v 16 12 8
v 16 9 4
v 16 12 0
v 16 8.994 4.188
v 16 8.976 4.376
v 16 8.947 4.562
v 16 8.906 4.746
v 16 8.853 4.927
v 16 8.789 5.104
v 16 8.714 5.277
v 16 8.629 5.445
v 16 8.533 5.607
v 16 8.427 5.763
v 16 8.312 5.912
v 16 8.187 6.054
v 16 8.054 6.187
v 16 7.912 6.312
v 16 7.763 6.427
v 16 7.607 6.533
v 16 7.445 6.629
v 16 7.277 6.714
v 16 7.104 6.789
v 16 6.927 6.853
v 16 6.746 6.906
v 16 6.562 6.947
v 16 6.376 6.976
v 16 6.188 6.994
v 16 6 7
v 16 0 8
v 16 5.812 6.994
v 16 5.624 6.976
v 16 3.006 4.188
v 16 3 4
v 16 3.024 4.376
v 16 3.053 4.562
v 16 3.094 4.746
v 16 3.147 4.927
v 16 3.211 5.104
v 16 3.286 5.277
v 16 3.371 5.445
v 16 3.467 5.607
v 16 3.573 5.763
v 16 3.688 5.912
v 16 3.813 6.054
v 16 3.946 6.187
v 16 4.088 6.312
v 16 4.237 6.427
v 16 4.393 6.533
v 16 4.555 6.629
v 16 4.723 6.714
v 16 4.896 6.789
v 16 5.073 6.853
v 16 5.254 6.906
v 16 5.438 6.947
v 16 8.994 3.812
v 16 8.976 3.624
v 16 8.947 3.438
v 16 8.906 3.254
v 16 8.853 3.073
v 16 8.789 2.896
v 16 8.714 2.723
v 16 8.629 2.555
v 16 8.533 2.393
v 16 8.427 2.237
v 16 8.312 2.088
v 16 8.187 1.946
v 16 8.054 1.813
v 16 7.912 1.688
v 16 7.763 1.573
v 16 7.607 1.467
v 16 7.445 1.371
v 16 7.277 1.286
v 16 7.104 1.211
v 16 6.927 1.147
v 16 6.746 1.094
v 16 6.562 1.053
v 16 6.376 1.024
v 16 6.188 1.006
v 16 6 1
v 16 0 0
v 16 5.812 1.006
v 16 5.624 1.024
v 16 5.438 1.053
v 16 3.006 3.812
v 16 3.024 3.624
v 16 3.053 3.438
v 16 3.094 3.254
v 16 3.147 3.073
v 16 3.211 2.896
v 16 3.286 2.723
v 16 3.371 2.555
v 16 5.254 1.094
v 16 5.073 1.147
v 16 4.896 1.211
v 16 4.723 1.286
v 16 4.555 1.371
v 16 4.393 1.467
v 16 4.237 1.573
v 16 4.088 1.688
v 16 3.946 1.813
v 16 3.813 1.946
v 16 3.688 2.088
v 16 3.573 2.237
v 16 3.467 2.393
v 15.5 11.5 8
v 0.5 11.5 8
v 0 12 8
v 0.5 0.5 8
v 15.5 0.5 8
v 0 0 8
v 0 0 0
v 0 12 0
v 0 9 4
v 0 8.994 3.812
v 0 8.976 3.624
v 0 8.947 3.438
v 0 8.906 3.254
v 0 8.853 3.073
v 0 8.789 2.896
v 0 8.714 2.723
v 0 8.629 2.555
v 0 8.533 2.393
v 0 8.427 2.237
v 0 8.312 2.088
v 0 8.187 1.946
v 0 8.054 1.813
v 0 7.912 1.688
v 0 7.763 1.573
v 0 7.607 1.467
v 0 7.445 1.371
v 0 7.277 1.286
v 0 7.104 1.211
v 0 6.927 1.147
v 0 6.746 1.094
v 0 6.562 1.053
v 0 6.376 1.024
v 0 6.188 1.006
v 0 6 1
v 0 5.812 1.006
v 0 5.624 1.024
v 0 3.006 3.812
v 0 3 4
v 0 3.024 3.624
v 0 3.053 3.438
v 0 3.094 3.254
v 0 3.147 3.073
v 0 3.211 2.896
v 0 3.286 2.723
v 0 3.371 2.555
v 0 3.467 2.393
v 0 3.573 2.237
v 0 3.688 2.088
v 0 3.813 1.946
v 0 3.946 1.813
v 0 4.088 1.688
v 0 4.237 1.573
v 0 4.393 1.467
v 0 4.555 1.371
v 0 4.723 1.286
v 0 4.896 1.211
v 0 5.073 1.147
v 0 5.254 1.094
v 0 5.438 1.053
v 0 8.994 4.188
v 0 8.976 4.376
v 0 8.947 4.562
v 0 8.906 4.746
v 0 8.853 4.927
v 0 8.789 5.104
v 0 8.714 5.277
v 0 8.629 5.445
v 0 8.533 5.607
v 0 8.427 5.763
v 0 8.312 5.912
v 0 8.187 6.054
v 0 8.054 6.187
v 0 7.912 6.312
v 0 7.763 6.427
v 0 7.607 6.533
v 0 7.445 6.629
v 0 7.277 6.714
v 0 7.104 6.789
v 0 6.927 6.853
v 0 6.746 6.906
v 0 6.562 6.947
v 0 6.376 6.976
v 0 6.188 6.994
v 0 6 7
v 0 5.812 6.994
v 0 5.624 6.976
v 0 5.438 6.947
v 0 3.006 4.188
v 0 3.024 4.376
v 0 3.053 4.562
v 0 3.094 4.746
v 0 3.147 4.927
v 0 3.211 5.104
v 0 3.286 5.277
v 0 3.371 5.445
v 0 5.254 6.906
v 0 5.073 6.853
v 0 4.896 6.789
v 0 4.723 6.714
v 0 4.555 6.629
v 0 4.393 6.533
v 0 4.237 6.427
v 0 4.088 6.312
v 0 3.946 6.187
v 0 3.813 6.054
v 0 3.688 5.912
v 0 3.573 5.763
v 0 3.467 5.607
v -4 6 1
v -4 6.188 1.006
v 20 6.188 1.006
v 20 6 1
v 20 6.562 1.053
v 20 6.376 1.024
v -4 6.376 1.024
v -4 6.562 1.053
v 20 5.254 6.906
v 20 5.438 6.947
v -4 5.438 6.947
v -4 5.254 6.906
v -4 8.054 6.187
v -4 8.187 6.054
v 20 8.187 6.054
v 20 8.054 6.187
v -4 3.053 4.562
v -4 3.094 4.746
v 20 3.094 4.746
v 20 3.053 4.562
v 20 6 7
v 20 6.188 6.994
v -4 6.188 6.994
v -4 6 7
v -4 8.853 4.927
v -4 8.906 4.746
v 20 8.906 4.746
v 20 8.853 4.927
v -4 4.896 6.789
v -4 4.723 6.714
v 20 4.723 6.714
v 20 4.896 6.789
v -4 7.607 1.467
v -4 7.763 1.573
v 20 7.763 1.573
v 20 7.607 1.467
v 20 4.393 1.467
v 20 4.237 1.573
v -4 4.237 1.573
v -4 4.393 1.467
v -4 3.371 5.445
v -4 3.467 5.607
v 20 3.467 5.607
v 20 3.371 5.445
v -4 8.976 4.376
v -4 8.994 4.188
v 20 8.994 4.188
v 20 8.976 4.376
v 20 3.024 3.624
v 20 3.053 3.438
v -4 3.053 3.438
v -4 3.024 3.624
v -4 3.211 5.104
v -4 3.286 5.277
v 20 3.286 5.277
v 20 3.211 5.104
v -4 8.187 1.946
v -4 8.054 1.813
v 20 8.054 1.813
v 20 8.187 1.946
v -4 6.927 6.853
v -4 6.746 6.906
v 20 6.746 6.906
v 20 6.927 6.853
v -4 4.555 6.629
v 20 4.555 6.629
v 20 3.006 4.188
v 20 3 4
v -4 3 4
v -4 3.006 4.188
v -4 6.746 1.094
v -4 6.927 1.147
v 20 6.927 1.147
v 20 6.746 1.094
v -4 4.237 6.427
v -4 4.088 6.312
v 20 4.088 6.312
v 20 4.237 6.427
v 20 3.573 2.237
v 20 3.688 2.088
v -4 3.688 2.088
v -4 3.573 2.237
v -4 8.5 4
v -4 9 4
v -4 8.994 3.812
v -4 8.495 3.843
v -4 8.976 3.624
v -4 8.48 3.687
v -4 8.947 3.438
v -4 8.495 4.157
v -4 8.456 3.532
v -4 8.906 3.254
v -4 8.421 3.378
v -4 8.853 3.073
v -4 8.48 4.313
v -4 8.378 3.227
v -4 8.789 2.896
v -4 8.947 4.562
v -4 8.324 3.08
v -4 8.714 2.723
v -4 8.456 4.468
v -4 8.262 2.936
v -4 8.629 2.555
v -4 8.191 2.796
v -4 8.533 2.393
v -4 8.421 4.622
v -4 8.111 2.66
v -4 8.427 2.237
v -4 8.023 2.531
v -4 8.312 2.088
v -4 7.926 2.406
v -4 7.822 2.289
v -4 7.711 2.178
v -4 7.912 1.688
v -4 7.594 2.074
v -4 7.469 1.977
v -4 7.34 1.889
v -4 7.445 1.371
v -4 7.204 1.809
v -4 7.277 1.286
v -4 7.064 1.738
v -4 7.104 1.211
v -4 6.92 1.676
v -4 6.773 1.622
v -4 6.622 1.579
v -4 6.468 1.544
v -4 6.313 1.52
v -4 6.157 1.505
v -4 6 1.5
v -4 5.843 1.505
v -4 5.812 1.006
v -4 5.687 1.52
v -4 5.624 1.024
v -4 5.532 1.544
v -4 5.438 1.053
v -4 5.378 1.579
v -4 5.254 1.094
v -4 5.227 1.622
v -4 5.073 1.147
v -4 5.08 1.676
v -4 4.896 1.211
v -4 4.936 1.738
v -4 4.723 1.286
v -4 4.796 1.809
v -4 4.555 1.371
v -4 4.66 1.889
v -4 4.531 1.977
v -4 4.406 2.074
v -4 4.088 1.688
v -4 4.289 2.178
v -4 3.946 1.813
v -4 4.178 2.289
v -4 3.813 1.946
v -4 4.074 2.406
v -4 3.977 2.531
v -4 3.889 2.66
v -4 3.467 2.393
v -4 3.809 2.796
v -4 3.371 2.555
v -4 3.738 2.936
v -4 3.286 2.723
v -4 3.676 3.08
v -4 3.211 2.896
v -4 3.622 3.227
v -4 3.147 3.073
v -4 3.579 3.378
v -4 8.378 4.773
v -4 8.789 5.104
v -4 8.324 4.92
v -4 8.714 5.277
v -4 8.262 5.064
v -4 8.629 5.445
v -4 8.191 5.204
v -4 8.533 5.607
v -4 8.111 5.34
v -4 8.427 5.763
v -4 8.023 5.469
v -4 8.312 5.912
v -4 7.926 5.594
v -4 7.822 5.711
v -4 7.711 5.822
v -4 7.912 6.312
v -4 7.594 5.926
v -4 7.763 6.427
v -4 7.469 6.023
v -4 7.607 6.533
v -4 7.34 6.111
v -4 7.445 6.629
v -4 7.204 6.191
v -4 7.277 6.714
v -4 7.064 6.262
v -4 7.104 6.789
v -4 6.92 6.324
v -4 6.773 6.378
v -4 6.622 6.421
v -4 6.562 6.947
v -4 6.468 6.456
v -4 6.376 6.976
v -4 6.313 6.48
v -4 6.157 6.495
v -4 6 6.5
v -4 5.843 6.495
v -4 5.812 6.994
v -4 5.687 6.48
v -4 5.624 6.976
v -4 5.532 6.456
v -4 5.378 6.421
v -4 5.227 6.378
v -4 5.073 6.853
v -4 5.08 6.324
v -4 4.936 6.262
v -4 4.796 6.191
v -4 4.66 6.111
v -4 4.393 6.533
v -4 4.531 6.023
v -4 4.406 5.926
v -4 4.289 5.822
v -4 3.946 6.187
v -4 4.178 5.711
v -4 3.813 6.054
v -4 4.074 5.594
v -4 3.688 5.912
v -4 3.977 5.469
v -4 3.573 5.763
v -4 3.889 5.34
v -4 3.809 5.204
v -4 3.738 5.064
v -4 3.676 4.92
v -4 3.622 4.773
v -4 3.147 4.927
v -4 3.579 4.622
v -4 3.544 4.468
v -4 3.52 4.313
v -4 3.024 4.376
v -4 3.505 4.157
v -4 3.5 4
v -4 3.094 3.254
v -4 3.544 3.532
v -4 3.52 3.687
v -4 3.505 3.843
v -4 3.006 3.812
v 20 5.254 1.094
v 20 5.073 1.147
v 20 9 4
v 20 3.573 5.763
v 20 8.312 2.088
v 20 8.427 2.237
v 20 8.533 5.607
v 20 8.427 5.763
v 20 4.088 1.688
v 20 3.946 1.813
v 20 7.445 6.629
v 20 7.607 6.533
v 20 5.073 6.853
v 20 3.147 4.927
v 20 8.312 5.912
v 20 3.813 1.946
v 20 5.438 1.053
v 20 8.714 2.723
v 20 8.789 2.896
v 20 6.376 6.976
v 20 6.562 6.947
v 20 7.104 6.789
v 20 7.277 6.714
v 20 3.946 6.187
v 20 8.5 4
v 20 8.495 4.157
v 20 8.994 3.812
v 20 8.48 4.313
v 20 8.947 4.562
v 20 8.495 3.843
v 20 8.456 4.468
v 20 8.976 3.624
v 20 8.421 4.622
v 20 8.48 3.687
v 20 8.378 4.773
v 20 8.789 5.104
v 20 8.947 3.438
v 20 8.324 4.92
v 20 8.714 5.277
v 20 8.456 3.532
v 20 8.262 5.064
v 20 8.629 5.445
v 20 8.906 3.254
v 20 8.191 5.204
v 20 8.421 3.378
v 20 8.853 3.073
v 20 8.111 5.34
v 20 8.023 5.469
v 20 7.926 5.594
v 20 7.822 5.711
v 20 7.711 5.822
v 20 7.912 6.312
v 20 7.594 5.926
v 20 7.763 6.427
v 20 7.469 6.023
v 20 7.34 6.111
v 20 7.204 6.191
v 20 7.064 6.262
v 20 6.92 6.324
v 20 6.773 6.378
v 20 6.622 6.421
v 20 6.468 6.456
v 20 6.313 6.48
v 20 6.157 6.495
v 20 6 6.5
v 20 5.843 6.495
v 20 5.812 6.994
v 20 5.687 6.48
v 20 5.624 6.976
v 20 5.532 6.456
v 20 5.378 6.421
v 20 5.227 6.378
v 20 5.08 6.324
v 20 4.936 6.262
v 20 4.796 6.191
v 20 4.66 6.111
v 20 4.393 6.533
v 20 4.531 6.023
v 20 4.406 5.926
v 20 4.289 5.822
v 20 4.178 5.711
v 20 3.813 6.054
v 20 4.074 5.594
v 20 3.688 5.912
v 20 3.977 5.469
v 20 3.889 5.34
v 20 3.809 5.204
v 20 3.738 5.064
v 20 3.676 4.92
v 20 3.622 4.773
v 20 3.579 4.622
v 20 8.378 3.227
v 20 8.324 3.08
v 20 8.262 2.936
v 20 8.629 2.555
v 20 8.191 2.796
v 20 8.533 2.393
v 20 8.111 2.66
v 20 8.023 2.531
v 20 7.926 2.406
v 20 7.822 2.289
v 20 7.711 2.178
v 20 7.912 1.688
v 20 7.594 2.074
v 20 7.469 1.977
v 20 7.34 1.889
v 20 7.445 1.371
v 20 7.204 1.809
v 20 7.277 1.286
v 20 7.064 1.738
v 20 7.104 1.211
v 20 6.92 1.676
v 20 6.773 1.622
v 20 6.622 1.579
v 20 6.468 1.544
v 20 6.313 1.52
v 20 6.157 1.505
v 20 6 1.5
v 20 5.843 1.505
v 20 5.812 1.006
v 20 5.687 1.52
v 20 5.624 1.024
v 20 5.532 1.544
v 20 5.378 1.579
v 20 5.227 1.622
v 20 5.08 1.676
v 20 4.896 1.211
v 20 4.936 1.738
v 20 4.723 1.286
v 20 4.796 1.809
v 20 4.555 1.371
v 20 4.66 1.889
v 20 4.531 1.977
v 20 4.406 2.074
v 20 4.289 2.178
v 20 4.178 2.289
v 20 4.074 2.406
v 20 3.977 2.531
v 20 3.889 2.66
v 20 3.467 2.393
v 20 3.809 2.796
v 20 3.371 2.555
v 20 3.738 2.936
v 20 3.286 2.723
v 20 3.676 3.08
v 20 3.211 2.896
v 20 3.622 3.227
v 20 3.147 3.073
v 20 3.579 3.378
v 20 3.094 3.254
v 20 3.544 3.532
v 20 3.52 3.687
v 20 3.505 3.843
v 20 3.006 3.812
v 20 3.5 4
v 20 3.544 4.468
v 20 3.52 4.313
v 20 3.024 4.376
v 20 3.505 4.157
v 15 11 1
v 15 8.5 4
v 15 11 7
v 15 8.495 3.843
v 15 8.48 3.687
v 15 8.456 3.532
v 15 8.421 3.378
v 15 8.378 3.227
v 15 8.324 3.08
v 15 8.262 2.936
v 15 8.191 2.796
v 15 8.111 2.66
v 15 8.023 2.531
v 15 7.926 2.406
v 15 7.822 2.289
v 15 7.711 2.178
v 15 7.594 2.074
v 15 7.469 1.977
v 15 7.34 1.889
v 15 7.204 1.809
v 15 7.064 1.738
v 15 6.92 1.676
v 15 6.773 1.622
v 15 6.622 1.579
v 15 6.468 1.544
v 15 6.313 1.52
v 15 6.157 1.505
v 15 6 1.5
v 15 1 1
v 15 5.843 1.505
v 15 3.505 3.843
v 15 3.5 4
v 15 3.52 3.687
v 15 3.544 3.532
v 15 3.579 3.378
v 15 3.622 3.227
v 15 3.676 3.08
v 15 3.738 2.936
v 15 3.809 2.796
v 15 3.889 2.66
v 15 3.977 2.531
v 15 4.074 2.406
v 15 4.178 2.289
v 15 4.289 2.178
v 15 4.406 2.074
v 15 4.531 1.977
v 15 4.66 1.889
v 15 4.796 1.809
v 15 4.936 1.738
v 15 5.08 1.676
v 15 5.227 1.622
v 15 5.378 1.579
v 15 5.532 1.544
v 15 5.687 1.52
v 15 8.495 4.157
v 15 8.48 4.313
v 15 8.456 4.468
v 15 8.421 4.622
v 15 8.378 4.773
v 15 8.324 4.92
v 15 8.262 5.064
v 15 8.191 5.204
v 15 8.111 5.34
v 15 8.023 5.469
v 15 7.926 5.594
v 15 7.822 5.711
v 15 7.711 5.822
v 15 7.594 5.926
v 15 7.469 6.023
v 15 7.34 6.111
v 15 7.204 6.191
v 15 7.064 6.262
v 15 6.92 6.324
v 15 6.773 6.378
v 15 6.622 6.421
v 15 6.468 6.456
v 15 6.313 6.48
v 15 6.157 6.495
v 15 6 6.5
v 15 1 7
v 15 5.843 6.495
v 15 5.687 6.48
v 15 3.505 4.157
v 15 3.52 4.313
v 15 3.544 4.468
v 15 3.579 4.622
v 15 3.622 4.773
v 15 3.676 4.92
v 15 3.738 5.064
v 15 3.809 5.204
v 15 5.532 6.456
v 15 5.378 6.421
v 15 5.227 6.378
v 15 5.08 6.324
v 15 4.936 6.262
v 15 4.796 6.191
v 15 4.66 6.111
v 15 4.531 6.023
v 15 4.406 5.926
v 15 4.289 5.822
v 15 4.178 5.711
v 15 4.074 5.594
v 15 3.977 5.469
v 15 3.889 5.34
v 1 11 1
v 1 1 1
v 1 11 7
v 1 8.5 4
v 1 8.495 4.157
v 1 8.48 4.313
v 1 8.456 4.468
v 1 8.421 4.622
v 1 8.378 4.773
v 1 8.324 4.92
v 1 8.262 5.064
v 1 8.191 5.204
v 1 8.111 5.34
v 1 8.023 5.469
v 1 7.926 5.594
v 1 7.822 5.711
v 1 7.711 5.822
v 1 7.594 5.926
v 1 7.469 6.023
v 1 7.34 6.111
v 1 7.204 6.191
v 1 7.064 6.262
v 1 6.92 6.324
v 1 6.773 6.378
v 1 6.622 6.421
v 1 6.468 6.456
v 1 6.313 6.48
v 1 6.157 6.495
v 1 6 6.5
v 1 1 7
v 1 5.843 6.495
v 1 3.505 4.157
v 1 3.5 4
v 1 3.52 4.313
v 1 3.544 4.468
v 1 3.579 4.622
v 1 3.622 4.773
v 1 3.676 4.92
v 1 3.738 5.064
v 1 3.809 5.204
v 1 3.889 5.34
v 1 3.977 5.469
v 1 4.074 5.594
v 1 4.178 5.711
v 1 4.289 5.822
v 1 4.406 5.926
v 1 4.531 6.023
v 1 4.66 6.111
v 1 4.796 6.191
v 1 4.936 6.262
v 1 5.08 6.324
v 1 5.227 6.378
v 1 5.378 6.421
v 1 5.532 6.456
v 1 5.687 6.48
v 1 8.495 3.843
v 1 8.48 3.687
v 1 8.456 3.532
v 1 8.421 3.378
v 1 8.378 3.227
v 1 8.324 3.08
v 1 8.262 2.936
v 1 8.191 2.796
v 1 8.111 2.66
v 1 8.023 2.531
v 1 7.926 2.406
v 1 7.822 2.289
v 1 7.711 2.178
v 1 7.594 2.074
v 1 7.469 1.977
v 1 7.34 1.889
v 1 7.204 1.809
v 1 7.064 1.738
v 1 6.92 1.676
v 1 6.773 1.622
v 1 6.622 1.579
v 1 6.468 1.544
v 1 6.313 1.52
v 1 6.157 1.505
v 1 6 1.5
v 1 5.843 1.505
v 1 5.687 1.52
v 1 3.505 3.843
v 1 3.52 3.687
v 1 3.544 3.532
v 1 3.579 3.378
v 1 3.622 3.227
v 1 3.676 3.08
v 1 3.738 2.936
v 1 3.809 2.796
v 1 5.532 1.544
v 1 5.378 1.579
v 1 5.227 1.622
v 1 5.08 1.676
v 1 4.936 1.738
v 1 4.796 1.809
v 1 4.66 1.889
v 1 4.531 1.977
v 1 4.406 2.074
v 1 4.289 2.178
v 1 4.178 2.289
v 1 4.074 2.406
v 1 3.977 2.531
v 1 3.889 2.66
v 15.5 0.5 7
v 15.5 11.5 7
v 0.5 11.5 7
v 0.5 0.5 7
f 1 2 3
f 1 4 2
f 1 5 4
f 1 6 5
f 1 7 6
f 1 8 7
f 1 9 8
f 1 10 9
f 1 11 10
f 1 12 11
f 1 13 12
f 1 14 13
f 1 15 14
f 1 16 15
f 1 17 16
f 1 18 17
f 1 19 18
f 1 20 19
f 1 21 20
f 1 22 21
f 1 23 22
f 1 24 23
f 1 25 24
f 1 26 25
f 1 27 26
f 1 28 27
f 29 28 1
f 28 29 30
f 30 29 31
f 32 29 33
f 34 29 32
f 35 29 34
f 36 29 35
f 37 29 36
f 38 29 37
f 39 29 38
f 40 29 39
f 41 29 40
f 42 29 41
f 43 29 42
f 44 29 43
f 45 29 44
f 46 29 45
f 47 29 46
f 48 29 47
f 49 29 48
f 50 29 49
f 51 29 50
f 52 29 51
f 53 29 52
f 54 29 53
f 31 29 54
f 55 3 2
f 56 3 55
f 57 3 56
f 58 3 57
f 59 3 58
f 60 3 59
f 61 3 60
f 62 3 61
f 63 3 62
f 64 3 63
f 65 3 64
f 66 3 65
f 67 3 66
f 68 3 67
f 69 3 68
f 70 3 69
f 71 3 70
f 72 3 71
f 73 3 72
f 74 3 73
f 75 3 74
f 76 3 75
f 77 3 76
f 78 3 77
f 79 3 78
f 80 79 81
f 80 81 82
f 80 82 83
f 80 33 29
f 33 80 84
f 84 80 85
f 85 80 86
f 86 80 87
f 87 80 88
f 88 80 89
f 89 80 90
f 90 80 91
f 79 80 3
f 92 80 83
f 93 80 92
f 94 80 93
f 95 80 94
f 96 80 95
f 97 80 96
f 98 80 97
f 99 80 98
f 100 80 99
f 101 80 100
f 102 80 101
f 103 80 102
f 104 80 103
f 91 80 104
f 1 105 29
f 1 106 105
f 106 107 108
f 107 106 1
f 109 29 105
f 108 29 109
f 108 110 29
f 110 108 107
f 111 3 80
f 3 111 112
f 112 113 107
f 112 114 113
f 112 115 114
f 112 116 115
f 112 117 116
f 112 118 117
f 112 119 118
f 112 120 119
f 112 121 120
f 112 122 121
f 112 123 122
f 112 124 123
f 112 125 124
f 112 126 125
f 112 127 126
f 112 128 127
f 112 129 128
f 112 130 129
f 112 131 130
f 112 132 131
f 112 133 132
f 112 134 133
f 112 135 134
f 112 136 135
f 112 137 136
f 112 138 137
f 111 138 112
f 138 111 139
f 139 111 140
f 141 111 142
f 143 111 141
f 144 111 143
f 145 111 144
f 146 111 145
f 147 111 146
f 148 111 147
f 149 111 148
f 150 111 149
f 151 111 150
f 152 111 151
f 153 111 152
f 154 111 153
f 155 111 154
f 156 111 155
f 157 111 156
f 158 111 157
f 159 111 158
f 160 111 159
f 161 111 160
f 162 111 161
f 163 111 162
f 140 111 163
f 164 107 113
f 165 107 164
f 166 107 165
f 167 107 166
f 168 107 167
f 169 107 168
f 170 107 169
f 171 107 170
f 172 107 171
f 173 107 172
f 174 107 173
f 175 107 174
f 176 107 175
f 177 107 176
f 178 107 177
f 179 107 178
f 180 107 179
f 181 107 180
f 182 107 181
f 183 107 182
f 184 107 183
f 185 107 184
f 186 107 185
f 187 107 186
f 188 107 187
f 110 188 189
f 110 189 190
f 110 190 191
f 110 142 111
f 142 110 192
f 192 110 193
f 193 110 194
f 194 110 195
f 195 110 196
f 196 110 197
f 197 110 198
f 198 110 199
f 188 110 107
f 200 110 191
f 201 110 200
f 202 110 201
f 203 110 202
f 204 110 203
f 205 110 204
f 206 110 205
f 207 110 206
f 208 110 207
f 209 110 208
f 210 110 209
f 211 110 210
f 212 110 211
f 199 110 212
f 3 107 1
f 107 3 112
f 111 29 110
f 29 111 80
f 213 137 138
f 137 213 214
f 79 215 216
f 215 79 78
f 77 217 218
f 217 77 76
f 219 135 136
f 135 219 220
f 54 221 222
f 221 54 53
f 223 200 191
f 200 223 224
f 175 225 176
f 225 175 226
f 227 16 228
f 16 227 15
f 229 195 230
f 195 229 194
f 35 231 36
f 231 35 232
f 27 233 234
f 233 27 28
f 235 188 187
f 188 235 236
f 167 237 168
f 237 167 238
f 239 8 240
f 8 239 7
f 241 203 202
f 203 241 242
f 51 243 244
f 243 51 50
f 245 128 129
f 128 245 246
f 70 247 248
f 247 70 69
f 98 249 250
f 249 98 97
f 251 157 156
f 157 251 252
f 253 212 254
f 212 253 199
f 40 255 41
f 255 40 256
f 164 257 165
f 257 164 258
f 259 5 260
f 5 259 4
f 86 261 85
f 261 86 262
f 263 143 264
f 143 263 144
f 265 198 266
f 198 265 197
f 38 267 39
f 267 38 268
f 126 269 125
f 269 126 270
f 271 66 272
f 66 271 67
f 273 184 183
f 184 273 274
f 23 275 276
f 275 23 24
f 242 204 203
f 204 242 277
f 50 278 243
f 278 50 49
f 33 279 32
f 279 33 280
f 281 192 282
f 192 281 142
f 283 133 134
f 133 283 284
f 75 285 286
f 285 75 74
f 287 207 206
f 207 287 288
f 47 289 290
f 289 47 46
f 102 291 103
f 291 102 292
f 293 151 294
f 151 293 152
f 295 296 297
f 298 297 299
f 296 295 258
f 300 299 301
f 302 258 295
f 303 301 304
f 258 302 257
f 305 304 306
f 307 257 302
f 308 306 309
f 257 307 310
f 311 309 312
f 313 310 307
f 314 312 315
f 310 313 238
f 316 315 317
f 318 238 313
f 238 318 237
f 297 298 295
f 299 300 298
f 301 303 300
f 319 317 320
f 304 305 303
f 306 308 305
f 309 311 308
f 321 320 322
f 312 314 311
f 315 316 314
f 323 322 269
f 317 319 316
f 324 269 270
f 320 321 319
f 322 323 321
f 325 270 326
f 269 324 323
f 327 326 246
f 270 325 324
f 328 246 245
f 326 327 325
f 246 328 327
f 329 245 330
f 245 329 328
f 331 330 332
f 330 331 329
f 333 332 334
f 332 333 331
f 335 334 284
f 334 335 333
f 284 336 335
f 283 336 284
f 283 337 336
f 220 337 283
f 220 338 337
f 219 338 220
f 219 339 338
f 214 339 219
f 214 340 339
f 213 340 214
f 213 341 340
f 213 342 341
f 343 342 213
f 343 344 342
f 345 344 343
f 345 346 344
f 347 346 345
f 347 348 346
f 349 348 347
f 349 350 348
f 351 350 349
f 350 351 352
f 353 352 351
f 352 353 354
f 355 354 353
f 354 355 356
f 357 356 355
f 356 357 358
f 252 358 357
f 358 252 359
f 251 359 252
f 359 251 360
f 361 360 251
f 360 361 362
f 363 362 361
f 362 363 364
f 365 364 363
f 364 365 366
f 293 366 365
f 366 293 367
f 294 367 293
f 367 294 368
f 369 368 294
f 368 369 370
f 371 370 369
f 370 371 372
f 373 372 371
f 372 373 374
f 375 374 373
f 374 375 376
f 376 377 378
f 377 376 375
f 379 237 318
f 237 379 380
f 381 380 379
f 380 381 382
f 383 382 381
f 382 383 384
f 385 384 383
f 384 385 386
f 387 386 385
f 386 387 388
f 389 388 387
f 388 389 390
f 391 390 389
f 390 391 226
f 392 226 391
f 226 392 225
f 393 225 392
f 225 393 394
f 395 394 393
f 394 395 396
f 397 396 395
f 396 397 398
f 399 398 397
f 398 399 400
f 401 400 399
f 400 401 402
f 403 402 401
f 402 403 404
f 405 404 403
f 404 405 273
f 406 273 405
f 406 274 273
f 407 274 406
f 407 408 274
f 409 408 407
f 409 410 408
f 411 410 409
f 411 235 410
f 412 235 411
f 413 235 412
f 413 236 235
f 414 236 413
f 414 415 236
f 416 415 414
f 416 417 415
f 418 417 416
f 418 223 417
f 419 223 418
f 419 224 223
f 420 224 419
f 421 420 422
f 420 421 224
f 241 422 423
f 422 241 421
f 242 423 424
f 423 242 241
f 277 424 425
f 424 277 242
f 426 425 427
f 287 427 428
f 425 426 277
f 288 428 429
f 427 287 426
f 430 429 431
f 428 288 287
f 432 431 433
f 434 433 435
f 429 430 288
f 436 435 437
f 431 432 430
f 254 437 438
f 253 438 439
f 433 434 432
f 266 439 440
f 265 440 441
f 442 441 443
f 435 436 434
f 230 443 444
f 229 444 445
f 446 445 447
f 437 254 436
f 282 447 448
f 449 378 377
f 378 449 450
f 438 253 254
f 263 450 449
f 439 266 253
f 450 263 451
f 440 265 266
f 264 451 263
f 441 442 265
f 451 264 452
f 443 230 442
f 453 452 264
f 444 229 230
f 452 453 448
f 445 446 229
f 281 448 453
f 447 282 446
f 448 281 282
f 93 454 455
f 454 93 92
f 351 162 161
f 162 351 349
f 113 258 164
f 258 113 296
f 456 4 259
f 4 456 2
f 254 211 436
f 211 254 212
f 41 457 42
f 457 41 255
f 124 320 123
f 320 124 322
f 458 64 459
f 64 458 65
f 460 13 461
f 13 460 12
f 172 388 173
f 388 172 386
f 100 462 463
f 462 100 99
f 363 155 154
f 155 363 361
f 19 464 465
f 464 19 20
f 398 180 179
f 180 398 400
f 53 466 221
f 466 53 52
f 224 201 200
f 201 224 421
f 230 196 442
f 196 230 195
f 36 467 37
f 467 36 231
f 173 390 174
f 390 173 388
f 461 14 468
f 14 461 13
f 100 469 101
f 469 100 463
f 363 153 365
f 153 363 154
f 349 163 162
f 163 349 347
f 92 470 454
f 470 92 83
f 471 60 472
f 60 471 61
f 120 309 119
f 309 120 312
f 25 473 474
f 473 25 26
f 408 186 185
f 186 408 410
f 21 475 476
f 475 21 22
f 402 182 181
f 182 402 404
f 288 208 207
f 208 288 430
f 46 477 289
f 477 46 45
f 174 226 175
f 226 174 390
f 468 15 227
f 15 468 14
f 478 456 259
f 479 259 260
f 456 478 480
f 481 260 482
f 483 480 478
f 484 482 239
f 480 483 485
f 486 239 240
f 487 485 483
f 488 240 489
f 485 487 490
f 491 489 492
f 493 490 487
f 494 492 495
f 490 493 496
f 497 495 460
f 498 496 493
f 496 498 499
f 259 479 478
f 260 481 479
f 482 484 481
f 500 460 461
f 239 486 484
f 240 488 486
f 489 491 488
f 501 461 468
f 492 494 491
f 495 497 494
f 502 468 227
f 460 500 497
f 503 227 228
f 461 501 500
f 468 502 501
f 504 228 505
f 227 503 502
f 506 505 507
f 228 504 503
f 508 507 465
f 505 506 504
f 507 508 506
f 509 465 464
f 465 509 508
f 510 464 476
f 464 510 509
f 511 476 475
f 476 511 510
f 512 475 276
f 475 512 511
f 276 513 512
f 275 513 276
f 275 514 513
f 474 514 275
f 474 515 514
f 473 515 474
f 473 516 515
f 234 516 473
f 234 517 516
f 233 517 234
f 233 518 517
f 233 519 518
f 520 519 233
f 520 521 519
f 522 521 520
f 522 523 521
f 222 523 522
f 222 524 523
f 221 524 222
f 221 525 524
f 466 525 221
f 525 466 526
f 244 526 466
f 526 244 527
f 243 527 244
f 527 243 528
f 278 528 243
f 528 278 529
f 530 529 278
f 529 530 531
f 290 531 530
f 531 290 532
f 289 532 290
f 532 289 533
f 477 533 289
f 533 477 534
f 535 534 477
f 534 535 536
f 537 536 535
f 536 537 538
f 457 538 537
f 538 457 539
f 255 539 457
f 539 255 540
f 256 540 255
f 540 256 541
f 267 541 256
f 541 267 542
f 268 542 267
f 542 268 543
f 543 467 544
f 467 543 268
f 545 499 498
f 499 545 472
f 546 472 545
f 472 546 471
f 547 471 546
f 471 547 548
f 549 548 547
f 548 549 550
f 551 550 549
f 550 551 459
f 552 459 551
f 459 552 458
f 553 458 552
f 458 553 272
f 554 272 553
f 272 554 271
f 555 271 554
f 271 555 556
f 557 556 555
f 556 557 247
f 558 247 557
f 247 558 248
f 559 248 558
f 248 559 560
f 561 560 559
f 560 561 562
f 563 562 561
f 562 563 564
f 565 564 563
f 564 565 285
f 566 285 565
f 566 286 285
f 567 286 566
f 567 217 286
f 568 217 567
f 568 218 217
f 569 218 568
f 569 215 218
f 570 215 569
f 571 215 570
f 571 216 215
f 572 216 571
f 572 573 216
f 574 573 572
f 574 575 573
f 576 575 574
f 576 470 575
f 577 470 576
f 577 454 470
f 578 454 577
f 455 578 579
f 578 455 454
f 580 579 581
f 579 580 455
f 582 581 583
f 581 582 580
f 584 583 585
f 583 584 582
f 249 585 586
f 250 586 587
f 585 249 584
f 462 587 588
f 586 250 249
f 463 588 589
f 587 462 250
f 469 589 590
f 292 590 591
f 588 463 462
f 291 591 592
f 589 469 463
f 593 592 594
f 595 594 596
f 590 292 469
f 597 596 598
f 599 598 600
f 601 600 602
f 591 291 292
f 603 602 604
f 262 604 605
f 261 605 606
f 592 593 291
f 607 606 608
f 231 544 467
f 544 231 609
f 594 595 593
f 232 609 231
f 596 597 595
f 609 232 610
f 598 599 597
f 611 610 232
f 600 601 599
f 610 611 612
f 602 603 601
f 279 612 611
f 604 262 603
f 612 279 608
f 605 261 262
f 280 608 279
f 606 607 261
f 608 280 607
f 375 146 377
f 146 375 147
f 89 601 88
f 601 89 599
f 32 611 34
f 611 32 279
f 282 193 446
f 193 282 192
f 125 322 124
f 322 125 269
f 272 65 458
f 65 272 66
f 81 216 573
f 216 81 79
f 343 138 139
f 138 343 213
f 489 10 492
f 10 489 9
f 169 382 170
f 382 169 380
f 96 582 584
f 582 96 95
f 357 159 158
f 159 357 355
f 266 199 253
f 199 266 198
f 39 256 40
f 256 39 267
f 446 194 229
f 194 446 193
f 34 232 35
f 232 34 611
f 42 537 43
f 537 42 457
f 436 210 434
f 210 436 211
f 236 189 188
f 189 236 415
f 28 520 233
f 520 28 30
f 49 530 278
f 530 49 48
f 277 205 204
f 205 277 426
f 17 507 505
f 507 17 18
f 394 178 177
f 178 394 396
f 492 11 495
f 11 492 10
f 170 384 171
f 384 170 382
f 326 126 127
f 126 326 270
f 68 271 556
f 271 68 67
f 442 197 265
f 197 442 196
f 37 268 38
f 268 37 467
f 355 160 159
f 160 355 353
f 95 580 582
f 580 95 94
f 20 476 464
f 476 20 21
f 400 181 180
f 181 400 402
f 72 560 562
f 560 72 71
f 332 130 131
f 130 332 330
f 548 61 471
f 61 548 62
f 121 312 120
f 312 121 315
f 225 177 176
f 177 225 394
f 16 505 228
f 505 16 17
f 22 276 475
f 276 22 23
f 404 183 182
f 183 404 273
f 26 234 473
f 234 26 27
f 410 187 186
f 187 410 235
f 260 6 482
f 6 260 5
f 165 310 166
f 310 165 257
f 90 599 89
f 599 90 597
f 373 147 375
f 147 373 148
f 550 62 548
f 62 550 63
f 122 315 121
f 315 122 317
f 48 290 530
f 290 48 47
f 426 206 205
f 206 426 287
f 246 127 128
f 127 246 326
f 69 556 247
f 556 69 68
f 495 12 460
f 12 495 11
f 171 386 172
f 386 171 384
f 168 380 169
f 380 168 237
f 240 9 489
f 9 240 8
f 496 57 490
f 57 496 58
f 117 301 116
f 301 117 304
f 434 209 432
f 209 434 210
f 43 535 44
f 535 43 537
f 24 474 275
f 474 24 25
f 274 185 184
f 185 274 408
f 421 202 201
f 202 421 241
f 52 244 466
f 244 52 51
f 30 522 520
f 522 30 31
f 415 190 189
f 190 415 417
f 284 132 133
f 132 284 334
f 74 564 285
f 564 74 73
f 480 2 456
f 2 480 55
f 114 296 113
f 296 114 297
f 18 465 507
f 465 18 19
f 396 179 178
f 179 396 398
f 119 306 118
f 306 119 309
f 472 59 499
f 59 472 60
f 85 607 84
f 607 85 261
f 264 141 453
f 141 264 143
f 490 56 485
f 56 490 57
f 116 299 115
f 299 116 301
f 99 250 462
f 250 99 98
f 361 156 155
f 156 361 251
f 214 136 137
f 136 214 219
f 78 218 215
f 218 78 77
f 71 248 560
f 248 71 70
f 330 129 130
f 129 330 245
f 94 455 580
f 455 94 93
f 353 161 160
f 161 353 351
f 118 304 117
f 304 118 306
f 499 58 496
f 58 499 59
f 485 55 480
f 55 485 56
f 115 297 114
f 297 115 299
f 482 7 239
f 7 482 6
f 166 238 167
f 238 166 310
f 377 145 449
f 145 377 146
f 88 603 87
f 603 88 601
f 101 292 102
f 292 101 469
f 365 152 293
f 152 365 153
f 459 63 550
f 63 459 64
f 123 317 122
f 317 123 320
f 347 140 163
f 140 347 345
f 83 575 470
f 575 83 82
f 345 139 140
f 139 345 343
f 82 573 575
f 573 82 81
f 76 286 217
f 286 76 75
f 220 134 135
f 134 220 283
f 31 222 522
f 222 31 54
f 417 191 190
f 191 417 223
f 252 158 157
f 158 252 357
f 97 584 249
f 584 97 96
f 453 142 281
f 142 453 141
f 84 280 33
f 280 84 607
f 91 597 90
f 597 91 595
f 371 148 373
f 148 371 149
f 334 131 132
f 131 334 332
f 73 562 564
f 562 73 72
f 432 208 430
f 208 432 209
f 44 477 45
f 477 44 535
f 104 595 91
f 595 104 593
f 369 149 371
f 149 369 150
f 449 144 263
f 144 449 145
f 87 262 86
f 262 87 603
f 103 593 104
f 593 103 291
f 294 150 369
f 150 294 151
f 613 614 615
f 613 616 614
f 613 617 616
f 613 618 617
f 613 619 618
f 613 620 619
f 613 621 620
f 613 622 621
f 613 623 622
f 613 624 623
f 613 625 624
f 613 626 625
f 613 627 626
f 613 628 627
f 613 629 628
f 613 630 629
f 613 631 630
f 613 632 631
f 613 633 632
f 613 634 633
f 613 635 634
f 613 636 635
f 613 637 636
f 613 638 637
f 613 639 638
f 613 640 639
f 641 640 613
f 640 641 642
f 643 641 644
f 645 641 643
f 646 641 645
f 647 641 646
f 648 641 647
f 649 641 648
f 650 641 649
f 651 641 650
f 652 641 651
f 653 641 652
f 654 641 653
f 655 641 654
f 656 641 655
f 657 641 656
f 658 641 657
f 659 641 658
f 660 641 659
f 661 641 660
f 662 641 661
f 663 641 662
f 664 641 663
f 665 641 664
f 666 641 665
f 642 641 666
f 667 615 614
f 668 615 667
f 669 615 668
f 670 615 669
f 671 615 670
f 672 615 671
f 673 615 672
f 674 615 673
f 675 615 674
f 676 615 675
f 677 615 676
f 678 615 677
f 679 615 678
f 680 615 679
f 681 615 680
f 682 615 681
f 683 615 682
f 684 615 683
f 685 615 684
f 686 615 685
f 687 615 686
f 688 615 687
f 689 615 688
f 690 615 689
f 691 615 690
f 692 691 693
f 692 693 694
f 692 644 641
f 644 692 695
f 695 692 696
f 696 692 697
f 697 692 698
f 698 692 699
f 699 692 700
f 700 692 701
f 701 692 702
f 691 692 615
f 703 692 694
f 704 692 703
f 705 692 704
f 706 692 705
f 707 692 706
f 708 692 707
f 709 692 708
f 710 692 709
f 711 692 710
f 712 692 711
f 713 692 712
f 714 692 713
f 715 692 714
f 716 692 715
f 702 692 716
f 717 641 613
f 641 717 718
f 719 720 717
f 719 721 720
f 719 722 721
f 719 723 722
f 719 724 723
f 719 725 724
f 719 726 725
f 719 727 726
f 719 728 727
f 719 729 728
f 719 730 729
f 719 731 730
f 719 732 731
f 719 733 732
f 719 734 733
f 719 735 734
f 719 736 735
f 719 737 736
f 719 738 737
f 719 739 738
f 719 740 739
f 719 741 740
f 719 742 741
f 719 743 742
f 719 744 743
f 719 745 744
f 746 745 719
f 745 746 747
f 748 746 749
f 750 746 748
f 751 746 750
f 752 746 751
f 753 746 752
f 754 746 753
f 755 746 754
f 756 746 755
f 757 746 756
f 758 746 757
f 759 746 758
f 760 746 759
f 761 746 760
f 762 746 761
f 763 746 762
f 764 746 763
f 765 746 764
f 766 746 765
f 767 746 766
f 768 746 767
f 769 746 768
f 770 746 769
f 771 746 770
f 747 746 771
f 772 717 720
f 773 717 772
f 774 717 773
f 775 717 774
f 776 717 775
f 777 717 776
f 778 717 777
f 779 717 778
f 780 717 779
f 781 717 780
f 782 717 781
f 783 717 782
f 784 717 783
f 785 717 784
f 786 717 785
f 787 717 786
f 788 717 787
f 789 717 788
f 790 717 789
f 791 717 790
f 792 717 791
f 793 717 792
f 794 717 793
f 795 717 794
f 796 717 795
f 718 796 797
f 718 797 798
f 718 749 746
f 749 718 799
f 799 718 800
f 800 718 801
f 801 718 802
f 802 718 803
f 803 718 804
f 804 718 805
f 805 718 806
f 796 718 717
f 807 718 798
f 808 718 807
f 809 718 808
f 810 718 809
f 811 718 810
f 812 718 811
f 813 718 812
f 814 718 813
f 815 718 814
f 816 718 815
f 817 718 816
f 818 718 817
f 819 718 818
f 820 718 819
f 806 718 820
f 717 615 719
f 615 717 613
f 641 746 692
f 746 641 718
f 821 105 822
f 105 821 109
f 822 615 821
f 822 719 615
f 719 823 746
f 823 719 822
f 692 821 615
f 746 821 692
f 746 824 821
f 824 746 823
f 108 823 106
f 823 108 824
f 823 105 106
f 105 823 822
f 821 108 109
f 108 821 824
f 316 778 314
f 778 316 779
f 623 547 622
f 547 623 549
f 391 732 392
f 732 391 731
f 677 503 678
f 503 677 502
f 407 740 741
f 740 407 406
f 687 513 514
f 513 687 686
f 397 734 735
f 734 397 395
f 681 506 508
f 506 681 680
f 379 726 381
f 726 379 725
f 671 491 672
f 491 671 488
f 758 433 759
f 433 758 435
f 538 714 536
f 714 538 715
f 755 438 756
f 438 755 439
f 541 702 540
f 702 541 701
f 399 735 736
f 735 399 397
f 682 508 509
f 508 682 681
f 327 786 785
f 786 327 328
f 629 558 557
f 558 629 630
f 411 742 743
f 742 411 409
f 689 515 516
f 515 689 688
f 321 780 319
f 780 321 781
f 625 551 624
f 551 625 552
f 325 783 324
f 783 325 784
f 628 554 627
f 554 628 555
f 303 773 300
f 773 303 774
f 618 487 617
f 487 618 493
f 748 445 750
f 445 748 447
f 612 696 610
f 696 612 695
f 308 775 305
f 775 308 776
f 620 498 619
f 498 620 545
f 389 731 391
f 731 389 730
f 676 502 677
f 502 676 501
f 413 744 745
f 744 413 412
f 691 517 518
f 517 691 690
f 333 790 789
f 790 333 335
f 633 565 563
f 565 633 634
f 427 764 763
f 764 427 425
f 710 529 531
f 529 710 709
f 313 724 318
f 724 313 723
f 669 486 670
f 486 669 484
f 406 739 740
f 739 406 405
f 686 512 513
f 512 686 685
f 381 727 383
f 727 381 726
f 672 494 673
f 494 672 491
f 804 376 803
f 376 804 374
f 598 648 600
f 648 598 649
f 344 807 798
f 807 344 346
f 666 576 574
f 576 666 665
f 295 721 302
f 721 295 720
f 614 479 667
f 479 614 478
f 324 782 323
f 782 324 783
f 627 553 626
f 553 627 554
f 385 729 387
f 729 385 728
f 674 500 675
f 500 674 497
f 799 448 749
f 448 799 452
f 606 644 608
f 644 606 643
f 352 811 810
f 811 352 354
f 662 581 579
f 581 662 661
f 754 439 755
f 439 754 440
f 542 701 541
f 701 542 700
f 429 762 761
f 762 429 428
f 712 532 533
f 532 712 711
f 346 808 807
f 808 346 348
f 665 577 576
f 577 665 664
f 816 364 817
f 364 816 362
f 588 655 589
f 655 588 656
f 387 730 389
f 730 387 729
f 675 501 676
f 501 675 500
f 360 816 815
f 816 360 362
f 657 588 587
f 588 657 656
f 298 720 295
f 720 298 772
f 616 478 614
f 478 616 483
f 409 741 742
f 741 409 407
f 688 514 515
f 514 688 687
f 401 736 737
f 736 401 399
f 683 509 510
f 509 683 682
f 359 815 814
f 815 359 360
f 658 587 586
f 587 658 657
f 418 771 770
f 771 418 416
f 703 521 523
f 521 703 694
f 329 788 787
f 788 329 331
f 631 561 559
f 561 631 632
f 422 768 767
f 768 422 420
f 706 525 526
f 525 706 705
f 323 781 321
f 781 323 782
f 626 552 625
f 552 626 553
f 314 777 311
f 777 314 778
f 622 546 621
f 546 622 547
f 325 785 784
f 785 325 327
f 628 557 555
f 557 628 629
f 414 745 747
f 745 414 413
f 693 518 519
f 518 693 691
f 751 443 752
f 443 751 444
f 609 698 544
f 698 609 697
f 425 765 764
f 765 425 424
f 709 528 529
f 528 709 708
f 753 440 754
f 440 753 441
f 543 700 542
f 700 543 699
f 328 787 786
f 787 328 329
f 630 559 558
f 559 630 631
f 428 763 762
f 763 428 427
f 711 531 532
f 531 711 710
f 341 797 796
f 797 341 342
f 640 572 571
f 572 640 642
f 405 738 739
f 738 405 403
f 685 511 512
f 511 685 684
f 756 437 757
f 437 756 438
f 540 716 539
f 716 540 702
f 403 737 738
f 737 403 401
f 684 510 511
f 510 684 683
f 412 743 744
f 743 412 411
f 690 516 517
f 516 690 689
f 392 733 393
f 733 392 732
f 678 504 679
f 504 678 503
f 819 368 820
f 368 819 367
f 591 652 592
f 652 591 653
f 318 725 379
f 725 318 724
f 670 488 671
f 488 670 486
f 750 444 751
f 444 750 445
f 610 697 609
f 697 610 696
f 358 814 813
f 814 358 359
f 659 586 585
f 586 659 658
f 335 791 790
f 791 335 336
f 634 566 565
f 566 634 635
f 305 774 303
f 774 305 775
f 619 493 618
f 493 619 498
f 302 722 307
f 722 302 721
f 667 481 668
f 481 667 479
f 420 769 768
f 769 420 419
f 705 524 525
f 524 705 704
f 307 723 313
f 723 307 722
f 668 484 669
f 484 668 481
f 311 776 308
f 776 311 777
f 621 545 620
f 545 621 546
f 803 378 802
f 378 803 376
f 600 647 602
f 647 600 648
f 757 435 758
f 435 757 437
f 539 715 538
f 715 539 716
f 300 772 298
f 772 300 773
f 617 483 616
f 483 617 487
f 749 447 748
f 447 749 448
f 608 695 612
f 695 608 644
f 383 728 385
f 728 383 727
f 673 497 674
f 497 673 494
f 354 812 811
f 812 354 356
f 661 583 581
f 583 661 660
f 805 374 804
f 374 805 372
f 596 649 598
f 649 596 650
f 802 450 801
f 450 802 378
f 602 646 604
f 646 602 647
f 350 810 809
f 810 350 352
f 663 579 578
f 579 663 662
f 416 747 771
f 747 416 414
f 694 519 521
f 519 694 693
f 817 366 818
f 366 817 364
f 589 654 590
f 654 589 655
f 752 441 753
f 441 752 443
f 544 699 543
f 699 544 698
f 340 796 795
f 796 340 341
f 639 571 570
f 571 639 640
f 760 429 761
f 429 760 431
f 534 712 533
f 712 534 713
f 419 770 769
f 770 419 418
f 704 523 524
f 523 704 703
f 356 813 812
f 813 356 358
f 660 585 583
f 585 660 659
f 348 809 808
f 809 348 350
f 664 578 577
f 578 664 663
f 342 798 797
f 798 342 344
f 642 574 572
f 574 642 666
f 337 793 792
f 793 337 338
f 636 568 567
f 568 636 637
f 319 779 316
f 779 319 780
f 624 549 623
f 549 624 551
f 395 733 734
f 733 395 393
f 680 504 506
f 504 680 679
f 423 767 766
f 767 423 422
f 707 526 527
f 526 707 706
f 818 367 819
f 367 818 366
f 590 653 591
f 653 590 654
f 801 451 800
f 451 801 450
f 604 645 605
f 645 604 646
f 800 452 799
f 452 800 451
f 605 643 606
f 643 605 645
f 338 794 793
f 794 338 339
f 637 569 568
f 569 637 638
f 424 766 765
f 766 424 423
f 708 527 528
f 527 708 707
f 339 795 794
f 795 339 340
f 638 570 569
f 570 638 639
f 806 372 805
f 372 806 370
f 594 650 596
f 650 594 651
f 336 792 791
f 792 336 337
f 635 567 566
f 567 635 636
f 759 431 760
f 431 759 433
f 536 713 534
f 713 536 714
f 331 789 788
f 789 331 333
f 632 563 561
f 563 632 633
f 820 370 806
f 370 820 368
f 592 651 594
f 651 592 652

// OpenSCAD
$ht=8;   // height
$wd=15  ;  // width
$dp=11;  // depth
$wall=1; // wall thickness

color("yellow")
  //translate([0, 0, 0])
//   difference() {
 //  translate([0,0,0]) cube([15,11,$ht], center=false);
 //  
 //      union() {
//         translate([10,1,8]) { cube([13,9,$ht+4], center=false); }
//        translate([7.5,5.5,-1]) cylinder(h = 4, r=0.5, center = false, $fn=100);
//        translate([5.5,5.5,-1]) cylinder(h = 4, r=0.5, center = false, $fn=100);
//        translate([9.5,5.5,-1]) cylinder(h = 4, r=0.5, center = false, $fn=100);
 //       translate(0,0,-1)
 //       linear_extrude(height=9)
 //         square([13,9], center=true)
 //     }
      //linear_extrude(height=10) translate([0,0,0]) square([15,11], center=false);
  //  }
            
         
//   difference() {cube(12,center=true); cube(8, center=false); }   
            
 difference() {
   union() {
        cube([$wd+1,$dp+1,$ht], center=false);
        rotate([0,-90,0]) translate([4,6,-20]) cylinder(h=24, r=3, centre=false, $fn=100);
   }
   union() {
//     translate([
     translate([$wall,$wall,$wall]) { cube([$wd-$wall,$dp-$wall,$ht+4], center=false); }
//     rotate([0,-90,0]) translate([7.5,5.5,-1]) cylinder(h = 4, r=0.5, center = false, $fn=100);
//     rotate([0,-90,0]) translate([5.5,5.5,-1]) cylinder(h = 4, r=0.5, center = false, $fn=100);
//     rotate([0,-90,0]) translate([9.5,5.5,-1]) cylinder(h = 4, r=0.5, center = false, $fn=100);
//     translate([$wd/3,($dp+$wall)/2,-$wall]) cube([$wd/3,$wall/2,$wall*3],center=false);
     translate([$wall/2,$wall/2,$ht-$wall]) { cube([$wd,$dp,$wall*3], center=false); }
     rotate([0,-90,0]) translate([4,6,-24]) cylinder(h=32, r=2.5, centre=false, $fn=100);
   }
 };   
 //difference() {
    //rotate([0,-90,0]) translate([4,6,-20]) cylinder(h=24, r=3, centre=false, $fn=100);
    //rotate([0,-90,0]) translate([4,6,-4]) cylinder(h=18, r=2.5, centre=false, $fn=100);
 //}
